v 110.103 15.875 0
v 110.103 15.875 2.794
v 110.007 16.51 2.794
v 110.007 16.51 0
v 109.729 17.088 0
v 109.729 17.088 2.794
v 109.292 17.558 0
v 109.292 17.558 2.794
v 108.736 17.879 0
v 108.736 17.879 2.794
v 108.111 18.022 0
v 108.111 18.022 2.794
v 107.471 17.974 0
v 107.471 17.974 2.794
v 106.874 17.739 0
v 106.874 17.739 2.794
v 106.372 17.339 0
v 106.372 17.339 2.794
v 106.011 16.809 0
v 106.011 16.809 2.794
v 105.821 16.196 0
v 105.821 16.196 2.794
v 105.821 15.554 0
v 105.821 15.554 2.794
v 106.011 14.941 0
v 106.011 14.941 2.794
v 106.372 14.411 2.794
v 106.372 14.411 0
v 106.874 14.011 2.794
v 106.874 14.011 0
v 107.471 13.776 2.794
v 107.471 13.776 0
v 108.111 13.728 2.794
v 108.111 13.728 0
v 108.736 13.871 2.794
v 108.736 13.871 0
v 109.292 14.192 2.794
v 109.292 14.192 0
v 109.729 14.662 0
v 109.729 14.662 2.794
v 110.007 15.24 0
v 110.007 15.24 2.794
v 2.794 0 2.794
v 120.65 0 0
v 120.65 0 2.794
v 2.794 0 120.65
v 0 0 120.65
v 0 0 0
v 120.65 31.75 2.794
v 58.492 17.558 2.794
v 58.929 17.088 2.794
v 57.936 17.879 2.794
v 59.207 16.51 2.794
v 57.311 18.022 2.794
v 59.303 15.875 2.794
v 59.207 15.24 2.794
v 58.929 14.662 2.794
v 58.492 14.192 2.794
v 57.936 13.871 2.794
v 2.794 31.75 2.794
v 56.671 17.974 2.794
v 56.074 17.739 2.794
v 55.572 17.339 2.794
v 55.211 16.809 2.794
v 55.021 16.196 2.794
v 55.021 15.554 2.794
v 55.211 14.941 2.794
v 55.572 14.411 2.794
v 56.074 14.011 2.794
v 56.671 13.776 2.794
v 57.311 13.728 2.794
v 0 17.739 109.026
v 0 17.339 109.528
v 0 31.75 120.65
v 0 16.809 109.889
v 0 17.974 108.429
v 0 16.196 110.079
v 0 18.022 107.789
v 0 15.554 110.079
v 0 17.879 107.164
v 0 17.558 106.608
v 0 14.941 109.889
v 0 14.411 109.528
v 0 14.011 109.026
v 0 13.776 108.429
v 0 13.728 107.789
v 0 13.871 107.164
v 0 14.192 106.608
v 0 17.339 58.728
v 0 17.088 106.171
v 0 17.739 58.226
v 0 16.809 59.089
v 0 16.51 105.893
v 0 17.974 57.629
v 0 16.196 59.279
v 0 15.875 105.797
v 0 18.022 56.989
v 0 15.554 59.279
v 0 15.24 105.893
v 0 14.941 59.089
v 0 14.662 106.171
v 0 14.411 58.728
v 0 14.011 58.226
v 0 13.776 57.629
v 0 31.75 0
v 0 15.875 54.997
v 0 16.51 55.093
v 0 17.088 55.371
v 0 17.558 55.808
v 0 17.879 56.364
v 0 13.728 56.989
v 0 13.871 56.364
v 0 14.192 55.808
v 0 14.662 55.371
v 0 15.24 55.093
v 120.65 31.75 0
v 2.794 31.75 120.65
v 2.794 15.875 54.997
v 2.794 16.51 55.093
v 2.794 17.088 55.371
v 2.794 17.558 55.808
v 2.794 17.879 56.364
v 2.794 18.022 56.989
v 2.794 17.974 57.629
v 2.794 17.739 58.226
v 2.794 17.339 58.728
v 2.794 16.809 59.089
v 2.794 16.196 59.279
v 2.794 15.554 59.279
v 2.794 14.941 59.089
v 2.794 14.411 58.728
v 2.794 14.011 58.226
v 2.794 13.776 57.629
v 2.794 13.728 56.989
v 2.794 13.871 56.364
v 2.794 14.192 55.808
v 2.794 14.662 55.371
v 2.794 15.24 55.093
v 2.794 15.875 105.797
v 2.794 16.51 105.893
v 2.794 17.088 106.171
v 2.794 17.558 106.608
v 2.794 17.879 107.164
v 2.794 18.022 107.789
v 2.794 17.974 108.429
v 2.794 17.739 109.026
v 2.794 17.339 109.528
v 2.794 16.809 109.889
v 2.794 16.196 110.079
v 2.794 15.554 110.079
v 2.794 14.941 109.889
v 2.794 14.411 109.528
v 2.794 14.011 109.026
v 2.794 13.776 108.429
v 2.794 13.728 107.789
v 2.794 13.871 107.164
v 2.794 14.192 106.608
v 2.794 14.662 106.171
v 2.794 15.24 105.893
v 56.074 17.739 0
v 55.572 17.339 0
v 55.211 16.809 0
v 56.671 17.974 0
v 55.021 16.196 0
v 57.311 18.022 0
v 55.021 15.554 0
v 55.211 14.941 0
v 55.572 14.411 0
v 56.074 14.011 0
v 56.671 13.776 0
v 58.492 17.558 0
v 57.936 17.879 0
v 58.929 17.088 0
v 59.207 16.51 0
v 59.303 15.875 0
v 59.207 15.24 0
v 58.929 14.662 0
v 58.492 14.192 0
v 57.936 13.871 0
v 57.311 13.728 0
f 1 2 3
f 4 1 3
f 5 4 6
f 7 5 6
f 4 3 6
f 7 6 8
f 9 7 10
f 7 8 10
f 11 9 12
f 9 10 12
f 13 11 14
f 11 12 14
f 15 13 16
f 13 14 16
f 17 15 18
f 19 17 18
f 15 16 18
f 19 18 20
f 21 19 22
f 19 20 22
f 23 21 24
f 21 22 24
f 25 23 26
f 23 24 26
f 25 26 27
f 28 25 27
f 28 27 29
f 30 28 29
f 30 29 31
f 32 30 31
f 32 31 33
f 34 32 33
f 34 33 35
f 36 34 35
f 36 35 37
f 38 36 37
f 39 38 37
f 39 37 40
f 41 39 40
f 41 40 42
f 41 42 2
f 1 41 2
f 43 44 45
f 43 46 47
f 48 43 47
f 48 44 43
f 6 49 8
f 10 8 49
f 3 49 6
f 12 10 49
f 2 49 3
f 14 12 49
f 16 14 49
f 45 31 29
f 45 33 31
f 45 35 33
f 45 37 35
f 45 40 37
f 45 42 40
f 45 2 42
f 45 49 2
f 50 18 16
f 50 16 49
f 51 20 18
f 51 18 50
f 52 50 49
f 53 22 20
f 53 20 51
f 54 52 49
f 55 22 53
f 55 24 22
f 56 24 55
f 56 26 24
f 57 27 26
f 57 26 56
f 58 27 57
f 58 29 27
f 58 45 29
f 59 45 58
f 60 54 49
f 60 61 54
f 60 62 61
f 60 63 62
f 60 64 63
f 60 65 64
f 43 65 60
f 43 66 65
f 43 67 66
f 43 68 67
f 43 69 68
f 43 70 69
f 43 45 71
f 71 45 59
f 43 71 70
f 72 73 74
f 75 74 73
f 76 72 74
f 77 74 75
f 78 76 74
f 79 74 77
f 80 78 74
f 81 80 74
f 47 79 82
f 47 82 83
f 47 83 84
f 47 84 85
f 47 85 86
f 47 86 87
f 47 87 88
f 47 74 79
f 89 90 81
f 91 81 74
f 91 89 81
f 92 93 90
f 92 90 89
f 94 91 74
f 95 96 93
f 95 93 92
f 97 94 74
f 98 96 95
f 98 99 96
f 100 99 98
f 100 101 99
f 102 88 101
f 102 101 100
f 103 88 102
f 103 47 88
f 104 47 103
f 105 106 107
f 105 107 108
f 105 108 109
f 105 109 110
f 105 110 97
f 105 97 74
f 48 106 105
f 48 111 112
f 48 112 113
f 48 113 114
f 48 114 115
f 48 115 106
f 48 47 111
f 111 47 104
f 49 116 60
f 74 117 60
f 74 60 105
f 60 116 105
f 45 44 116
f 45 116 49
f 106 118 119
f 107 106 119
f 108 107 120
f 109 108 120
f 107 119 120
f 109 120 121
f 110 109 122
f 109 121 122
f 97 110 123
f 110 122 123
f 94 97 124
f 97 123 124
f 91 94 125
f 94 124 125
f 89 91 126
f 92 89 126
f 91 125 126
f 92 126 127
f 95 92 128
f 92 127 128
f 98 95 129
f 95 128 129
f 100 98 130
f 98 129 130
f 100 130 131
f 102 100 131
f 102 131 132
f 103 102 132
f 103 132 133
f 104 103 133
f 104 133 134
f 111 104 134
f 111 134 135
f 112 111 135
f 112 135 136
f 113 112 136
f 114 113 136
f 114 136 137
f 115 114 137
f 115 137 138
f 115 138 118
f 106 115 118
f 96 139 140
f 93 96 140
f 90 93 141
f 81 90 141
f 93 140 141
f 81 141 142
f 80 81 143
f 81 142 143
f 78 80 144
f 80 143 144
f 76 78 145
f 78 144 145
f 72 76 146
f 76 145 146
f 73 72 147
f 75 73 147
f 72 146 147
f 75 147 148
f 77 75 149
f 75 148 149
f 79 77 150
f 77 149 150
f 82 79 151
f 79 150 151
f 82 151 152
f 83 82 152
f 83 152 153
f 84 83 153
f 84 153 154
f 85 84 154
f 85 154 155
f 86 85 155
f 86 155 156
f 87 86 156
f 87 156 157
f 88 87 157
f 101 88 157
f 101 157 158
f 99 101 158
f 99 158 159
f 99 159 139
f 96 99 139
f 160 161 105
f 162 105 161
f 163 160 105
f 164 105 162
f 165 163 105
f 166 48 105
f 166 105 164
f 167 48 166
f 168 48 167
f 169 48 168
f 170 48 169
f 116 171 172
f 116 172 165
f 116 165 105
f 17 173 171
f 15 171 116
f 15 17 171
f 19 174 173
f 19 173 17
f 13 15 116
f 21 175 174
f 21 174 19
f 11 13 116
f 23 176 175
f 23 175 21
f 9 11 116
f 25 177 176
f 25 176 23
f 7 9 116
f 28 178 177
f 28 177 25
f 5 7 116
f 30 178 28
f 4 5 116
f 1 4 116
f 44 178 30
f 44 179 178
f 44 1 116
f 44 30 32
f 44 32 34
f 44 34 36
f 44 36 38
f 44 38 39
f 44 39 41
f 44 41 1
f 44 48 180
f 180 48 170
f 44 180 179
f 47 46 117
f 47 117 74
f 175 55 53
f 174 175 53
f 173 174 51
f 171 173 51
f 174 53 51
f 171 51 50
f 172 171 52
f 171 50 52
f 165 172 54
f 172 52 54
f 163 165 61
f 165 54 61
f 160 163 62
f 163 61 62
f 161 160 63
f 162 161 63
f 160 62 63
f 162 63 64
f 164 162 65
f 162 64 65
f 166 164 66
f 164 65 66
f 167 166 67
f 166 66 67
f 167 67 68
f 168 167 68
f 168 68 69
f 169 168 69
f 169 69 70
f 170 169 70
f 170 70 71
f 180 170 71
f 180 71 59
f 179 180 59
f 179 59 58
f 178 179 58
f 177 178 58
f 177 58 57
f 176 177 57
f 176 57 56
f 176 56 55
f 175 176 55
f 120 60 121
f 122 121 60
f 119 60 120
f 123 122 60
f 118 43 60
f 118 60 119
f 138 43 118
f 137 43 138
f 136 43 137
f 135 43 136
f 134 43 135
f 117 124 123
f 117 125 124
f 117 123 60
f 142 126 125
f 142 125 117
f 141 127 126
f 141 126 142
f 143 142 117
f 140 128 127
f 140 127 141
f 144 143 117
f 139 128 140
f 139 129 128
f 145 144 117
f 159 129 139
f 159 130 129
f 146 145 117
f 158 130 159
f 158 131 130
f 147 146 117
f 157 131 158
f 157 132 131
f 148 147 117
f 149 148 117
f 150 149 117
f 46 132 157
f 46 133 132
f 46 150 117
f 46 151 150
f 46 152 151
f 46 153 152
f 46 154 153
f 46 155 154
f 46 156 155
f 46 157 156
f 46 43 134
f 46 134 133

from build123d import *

# Parameters (mm, degrees)
BOSS_EXTRUDE1_DEPTH       = 31.75
F_8_CLEARANCE_HOLE1_D     = 4.3053
F_8_CLEARANCE_HOLE1_DEPTH = 6.35
F_8_CLEARANCE_HOLE1_TIP   = 1.293442612
F_8_CLEARANCE_HOLE2_D     = 4.3053
F_8_CLEARANCE_HOLE2_DEPTH = 6.35
F_8_CLEARANCE_HOLE2_TIP   = 1.293442612


with BuildPart() as part:
    # Sketch1 → Boss-Extrude1 (new body)
    with BuildSketch(Plane(origin=(0, 0, 0), x_dir=(1, 0, 0), z_dir=(0, 1, 0))):
        Polygon((0, 0), (120.65, 0), (120.65, -2.794), (2.794, -2.794), (2.794, -120.65), (0, -120.65), align=None)
    extrude(amount=BOSS_EXTRUDE1_DEPTH)

    # #8 Clearance Hole1
    with Locations(Plane(origin=(0, 0, 0), x_dir=(-1, 0, 0), z_dir=(0, 0, -1))):
        with Locations((-107.95, 15.875), (-57.15, 15.875)):
            Hole(F_8_CLEARANCE_HOLE1_D / 2, depth=F_8_CLEARANCE_HOLE1_DEPTH)
            with Locations((0, 0, -(F_8_CLEARANCE_HOLE1_DEPTH + F_8_CLEARANCE_HOLE1_TIP / 2))):  # 118° drill point
                Cone(0, F_8_CLEARANCE_HOLE1_D / 2, F_8_CLEARANCE_HOLE1_TIP, mode=Mode.SUBTRACT)

    # #8 Clearance Hole2
    with Locations(Plane.ZY):
        with Locations((107.95, 15.875), (57.15, 15.875)):
            Hole(F_8_CLEARANCE_HOLE2_D / 2, depth=F_8_CLEARANCE_HOLE2_DEPTH)
            with Locations((0, 0, -(F_8_CLEARANCE_HOLE2_DEPTH + F_8_CLEARANCE_HOLE2_TIP / 2))):  # 118° drill point
                Cone(0, F_8_CLEARANCE_HOLE2_D / 2, F_8_CLEARANCE_HOLE2_TIP, mode=Mode.SUBTRACT)


solid = part.part
